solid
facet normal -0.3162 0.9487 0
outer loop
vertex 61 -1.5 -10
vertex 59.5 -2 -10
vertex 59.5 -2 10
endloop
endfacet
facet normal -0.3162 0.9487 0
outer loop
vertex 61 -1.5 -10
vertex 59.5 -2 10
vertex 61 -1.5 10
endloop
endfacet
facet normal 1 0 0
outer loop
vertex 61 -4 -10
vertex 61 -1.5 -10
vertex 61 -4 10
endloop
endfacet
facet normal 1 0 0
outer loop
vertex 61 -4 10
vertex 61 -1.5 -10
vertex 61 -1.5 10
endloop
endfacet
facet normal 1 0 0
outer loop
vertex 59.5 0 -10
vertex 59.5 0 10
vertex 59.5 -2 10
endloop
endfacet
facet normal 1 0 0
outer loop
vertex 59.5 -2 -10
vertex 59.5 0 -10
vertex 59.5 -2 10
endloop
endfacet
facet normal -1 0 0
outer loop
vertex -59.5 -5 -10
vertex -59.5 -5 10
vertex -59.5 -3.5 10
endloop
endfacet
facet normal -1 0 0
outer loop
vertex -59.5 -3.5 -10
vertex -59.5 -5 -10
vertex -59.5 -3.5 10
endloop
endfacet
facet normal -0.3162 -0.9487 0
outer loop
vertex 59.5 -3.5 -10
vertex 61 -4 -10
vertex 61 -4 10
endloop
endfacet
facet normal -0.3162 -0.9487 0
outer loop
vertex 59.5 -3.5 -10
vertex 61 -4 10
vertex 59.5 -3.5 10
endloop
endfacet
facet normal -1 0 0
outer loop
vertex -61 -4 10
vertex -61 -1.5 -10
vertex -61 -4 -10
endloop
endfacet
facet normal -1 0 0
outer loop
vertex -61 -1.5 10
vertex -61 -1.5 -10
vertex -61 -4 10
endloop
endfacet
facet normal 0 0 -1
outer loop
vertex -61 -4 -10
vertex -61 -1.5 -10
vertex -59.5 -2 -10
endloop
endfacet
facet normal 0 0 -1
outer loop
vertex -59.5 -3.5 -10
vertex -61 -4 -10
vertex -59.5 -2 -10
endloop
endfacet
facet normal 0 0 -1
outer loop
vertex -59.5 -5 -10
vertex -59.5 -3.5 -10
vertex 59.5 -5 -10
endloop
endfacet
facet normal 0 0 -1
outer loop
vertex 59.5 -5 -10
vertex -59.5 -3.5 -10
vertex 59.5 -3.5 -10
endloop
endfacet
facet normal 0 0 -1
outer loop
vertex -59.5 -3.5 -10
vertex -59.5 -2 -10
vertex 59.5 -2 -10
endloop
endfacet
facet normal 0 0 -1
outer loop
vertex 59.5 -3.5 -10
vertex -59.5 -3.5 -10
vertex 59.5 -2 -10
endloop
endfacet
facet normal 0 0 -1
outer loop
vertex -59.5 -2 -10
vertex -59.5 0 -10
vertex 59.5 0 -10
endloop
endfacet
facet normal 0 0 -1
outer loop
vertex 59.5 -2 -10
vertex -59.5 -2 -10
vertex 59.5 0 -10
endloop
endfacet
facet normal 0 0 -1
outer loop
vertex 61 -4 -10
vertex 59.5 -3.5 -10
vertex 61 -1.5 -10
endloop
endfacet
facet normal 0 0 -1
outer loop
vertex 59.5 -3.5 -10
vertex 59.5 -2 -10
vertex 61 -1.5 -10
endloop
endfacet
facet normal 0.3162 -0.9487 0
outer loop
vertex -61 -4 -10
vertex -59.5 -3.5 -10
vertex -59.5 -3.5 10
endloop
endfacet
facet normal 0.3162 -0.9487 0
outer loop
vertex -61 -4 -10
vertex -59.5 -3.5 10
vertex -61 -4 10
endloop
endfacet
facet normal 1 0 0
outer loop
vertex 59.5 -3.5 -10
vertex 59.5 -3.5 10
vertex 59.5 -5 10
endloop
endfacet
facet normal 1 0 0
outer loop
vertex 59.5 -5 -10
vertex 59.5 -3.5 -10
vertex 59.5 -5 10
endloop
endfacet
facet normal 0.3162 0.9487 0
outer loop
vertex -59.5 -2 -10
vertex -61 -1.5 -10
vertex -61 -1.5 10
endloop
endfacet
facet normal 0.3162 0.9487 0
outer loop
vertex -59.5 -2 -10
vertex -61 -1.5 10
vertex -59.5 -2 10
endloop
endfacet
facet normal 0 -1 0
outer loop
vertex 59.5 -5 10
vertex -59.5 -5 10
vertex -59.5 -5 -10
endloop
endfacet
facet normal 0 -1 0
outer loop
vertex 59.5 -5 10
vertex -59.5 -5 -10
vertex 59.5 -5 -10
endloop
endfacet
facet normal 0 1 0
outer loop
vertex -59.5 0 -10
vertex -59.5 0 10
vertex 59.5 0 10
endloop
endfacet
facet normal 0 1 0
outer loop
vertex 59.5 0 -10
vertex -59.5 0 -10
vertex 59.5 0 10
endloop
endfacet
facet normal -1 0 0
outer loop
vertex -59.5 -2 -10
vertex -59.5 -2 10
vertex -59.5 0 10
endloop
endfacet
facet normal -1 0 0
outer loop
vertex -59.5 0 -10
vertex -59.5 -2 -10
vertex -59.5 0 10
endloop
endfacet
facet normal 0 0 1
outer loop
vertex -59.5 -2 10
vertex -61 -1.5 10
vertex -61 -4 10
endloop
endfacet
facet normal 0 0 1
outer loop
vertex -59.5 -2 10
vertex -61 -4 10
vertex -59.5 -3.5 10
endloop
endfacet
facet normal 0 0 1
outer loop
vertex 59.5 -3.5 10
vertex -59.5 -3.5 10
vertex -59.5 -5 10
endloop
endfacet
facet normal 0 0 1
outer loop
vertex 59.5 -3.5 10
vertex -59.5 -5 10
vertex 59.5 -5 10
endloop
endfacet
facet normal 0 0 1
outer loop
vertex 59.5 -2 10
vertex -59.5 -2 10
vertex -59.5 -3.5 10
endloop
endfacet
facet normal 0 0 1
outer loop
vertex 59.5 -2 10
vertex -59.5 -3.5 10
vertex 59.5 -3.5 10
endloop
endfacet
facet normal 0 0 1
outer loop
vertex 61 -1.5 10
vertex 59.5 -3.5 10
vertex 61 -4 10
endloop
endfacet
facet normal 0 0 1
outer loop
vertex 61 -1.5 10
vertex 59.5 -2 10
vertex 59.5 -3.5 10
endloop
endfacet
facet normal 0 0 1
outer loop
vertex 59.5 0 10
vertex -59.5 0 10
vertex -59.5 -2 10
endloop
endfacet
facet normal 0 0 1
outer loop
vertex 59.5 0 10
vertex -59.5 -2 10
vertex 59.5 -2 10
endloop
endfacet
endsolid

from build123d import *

# Parameters (mm, degrees)
F0_W     = 122
F0_H     = 20
F1_DEPTH = 5
F3_DEPTH = 20.001


with BuildPart() as f1:
    # F0 (on Front) → F1 (new body)
    with BuildSketch(Plane.XZ):
        Rectangle(F0_W, F0_H)
    extrude(amount=F1_DEPTH)

    # F2 (on face) → F3 (cut, through all)
    with BuildSketch(Plane.XY.offset(10)):
        Polygon((-59.5, -2), (-59.5, 0), (-61, 0), (-61, -1.5), align=None)
        Polygon((-59.5, -3.5), (-61, -4), (-61, -5), (-59.5, -5), align=None)
        Polygon((61, 0), (59.5, 0), (59.5, -2), (61, -1.5), align=None)
        Polygon((61, -5), (61, -4), (59.5, -3.5), (59.5, -5), align=None)
    extrude(amount=-F3_DEPTH, mode=Mode.SUBTRACT)


solid = f1.part
